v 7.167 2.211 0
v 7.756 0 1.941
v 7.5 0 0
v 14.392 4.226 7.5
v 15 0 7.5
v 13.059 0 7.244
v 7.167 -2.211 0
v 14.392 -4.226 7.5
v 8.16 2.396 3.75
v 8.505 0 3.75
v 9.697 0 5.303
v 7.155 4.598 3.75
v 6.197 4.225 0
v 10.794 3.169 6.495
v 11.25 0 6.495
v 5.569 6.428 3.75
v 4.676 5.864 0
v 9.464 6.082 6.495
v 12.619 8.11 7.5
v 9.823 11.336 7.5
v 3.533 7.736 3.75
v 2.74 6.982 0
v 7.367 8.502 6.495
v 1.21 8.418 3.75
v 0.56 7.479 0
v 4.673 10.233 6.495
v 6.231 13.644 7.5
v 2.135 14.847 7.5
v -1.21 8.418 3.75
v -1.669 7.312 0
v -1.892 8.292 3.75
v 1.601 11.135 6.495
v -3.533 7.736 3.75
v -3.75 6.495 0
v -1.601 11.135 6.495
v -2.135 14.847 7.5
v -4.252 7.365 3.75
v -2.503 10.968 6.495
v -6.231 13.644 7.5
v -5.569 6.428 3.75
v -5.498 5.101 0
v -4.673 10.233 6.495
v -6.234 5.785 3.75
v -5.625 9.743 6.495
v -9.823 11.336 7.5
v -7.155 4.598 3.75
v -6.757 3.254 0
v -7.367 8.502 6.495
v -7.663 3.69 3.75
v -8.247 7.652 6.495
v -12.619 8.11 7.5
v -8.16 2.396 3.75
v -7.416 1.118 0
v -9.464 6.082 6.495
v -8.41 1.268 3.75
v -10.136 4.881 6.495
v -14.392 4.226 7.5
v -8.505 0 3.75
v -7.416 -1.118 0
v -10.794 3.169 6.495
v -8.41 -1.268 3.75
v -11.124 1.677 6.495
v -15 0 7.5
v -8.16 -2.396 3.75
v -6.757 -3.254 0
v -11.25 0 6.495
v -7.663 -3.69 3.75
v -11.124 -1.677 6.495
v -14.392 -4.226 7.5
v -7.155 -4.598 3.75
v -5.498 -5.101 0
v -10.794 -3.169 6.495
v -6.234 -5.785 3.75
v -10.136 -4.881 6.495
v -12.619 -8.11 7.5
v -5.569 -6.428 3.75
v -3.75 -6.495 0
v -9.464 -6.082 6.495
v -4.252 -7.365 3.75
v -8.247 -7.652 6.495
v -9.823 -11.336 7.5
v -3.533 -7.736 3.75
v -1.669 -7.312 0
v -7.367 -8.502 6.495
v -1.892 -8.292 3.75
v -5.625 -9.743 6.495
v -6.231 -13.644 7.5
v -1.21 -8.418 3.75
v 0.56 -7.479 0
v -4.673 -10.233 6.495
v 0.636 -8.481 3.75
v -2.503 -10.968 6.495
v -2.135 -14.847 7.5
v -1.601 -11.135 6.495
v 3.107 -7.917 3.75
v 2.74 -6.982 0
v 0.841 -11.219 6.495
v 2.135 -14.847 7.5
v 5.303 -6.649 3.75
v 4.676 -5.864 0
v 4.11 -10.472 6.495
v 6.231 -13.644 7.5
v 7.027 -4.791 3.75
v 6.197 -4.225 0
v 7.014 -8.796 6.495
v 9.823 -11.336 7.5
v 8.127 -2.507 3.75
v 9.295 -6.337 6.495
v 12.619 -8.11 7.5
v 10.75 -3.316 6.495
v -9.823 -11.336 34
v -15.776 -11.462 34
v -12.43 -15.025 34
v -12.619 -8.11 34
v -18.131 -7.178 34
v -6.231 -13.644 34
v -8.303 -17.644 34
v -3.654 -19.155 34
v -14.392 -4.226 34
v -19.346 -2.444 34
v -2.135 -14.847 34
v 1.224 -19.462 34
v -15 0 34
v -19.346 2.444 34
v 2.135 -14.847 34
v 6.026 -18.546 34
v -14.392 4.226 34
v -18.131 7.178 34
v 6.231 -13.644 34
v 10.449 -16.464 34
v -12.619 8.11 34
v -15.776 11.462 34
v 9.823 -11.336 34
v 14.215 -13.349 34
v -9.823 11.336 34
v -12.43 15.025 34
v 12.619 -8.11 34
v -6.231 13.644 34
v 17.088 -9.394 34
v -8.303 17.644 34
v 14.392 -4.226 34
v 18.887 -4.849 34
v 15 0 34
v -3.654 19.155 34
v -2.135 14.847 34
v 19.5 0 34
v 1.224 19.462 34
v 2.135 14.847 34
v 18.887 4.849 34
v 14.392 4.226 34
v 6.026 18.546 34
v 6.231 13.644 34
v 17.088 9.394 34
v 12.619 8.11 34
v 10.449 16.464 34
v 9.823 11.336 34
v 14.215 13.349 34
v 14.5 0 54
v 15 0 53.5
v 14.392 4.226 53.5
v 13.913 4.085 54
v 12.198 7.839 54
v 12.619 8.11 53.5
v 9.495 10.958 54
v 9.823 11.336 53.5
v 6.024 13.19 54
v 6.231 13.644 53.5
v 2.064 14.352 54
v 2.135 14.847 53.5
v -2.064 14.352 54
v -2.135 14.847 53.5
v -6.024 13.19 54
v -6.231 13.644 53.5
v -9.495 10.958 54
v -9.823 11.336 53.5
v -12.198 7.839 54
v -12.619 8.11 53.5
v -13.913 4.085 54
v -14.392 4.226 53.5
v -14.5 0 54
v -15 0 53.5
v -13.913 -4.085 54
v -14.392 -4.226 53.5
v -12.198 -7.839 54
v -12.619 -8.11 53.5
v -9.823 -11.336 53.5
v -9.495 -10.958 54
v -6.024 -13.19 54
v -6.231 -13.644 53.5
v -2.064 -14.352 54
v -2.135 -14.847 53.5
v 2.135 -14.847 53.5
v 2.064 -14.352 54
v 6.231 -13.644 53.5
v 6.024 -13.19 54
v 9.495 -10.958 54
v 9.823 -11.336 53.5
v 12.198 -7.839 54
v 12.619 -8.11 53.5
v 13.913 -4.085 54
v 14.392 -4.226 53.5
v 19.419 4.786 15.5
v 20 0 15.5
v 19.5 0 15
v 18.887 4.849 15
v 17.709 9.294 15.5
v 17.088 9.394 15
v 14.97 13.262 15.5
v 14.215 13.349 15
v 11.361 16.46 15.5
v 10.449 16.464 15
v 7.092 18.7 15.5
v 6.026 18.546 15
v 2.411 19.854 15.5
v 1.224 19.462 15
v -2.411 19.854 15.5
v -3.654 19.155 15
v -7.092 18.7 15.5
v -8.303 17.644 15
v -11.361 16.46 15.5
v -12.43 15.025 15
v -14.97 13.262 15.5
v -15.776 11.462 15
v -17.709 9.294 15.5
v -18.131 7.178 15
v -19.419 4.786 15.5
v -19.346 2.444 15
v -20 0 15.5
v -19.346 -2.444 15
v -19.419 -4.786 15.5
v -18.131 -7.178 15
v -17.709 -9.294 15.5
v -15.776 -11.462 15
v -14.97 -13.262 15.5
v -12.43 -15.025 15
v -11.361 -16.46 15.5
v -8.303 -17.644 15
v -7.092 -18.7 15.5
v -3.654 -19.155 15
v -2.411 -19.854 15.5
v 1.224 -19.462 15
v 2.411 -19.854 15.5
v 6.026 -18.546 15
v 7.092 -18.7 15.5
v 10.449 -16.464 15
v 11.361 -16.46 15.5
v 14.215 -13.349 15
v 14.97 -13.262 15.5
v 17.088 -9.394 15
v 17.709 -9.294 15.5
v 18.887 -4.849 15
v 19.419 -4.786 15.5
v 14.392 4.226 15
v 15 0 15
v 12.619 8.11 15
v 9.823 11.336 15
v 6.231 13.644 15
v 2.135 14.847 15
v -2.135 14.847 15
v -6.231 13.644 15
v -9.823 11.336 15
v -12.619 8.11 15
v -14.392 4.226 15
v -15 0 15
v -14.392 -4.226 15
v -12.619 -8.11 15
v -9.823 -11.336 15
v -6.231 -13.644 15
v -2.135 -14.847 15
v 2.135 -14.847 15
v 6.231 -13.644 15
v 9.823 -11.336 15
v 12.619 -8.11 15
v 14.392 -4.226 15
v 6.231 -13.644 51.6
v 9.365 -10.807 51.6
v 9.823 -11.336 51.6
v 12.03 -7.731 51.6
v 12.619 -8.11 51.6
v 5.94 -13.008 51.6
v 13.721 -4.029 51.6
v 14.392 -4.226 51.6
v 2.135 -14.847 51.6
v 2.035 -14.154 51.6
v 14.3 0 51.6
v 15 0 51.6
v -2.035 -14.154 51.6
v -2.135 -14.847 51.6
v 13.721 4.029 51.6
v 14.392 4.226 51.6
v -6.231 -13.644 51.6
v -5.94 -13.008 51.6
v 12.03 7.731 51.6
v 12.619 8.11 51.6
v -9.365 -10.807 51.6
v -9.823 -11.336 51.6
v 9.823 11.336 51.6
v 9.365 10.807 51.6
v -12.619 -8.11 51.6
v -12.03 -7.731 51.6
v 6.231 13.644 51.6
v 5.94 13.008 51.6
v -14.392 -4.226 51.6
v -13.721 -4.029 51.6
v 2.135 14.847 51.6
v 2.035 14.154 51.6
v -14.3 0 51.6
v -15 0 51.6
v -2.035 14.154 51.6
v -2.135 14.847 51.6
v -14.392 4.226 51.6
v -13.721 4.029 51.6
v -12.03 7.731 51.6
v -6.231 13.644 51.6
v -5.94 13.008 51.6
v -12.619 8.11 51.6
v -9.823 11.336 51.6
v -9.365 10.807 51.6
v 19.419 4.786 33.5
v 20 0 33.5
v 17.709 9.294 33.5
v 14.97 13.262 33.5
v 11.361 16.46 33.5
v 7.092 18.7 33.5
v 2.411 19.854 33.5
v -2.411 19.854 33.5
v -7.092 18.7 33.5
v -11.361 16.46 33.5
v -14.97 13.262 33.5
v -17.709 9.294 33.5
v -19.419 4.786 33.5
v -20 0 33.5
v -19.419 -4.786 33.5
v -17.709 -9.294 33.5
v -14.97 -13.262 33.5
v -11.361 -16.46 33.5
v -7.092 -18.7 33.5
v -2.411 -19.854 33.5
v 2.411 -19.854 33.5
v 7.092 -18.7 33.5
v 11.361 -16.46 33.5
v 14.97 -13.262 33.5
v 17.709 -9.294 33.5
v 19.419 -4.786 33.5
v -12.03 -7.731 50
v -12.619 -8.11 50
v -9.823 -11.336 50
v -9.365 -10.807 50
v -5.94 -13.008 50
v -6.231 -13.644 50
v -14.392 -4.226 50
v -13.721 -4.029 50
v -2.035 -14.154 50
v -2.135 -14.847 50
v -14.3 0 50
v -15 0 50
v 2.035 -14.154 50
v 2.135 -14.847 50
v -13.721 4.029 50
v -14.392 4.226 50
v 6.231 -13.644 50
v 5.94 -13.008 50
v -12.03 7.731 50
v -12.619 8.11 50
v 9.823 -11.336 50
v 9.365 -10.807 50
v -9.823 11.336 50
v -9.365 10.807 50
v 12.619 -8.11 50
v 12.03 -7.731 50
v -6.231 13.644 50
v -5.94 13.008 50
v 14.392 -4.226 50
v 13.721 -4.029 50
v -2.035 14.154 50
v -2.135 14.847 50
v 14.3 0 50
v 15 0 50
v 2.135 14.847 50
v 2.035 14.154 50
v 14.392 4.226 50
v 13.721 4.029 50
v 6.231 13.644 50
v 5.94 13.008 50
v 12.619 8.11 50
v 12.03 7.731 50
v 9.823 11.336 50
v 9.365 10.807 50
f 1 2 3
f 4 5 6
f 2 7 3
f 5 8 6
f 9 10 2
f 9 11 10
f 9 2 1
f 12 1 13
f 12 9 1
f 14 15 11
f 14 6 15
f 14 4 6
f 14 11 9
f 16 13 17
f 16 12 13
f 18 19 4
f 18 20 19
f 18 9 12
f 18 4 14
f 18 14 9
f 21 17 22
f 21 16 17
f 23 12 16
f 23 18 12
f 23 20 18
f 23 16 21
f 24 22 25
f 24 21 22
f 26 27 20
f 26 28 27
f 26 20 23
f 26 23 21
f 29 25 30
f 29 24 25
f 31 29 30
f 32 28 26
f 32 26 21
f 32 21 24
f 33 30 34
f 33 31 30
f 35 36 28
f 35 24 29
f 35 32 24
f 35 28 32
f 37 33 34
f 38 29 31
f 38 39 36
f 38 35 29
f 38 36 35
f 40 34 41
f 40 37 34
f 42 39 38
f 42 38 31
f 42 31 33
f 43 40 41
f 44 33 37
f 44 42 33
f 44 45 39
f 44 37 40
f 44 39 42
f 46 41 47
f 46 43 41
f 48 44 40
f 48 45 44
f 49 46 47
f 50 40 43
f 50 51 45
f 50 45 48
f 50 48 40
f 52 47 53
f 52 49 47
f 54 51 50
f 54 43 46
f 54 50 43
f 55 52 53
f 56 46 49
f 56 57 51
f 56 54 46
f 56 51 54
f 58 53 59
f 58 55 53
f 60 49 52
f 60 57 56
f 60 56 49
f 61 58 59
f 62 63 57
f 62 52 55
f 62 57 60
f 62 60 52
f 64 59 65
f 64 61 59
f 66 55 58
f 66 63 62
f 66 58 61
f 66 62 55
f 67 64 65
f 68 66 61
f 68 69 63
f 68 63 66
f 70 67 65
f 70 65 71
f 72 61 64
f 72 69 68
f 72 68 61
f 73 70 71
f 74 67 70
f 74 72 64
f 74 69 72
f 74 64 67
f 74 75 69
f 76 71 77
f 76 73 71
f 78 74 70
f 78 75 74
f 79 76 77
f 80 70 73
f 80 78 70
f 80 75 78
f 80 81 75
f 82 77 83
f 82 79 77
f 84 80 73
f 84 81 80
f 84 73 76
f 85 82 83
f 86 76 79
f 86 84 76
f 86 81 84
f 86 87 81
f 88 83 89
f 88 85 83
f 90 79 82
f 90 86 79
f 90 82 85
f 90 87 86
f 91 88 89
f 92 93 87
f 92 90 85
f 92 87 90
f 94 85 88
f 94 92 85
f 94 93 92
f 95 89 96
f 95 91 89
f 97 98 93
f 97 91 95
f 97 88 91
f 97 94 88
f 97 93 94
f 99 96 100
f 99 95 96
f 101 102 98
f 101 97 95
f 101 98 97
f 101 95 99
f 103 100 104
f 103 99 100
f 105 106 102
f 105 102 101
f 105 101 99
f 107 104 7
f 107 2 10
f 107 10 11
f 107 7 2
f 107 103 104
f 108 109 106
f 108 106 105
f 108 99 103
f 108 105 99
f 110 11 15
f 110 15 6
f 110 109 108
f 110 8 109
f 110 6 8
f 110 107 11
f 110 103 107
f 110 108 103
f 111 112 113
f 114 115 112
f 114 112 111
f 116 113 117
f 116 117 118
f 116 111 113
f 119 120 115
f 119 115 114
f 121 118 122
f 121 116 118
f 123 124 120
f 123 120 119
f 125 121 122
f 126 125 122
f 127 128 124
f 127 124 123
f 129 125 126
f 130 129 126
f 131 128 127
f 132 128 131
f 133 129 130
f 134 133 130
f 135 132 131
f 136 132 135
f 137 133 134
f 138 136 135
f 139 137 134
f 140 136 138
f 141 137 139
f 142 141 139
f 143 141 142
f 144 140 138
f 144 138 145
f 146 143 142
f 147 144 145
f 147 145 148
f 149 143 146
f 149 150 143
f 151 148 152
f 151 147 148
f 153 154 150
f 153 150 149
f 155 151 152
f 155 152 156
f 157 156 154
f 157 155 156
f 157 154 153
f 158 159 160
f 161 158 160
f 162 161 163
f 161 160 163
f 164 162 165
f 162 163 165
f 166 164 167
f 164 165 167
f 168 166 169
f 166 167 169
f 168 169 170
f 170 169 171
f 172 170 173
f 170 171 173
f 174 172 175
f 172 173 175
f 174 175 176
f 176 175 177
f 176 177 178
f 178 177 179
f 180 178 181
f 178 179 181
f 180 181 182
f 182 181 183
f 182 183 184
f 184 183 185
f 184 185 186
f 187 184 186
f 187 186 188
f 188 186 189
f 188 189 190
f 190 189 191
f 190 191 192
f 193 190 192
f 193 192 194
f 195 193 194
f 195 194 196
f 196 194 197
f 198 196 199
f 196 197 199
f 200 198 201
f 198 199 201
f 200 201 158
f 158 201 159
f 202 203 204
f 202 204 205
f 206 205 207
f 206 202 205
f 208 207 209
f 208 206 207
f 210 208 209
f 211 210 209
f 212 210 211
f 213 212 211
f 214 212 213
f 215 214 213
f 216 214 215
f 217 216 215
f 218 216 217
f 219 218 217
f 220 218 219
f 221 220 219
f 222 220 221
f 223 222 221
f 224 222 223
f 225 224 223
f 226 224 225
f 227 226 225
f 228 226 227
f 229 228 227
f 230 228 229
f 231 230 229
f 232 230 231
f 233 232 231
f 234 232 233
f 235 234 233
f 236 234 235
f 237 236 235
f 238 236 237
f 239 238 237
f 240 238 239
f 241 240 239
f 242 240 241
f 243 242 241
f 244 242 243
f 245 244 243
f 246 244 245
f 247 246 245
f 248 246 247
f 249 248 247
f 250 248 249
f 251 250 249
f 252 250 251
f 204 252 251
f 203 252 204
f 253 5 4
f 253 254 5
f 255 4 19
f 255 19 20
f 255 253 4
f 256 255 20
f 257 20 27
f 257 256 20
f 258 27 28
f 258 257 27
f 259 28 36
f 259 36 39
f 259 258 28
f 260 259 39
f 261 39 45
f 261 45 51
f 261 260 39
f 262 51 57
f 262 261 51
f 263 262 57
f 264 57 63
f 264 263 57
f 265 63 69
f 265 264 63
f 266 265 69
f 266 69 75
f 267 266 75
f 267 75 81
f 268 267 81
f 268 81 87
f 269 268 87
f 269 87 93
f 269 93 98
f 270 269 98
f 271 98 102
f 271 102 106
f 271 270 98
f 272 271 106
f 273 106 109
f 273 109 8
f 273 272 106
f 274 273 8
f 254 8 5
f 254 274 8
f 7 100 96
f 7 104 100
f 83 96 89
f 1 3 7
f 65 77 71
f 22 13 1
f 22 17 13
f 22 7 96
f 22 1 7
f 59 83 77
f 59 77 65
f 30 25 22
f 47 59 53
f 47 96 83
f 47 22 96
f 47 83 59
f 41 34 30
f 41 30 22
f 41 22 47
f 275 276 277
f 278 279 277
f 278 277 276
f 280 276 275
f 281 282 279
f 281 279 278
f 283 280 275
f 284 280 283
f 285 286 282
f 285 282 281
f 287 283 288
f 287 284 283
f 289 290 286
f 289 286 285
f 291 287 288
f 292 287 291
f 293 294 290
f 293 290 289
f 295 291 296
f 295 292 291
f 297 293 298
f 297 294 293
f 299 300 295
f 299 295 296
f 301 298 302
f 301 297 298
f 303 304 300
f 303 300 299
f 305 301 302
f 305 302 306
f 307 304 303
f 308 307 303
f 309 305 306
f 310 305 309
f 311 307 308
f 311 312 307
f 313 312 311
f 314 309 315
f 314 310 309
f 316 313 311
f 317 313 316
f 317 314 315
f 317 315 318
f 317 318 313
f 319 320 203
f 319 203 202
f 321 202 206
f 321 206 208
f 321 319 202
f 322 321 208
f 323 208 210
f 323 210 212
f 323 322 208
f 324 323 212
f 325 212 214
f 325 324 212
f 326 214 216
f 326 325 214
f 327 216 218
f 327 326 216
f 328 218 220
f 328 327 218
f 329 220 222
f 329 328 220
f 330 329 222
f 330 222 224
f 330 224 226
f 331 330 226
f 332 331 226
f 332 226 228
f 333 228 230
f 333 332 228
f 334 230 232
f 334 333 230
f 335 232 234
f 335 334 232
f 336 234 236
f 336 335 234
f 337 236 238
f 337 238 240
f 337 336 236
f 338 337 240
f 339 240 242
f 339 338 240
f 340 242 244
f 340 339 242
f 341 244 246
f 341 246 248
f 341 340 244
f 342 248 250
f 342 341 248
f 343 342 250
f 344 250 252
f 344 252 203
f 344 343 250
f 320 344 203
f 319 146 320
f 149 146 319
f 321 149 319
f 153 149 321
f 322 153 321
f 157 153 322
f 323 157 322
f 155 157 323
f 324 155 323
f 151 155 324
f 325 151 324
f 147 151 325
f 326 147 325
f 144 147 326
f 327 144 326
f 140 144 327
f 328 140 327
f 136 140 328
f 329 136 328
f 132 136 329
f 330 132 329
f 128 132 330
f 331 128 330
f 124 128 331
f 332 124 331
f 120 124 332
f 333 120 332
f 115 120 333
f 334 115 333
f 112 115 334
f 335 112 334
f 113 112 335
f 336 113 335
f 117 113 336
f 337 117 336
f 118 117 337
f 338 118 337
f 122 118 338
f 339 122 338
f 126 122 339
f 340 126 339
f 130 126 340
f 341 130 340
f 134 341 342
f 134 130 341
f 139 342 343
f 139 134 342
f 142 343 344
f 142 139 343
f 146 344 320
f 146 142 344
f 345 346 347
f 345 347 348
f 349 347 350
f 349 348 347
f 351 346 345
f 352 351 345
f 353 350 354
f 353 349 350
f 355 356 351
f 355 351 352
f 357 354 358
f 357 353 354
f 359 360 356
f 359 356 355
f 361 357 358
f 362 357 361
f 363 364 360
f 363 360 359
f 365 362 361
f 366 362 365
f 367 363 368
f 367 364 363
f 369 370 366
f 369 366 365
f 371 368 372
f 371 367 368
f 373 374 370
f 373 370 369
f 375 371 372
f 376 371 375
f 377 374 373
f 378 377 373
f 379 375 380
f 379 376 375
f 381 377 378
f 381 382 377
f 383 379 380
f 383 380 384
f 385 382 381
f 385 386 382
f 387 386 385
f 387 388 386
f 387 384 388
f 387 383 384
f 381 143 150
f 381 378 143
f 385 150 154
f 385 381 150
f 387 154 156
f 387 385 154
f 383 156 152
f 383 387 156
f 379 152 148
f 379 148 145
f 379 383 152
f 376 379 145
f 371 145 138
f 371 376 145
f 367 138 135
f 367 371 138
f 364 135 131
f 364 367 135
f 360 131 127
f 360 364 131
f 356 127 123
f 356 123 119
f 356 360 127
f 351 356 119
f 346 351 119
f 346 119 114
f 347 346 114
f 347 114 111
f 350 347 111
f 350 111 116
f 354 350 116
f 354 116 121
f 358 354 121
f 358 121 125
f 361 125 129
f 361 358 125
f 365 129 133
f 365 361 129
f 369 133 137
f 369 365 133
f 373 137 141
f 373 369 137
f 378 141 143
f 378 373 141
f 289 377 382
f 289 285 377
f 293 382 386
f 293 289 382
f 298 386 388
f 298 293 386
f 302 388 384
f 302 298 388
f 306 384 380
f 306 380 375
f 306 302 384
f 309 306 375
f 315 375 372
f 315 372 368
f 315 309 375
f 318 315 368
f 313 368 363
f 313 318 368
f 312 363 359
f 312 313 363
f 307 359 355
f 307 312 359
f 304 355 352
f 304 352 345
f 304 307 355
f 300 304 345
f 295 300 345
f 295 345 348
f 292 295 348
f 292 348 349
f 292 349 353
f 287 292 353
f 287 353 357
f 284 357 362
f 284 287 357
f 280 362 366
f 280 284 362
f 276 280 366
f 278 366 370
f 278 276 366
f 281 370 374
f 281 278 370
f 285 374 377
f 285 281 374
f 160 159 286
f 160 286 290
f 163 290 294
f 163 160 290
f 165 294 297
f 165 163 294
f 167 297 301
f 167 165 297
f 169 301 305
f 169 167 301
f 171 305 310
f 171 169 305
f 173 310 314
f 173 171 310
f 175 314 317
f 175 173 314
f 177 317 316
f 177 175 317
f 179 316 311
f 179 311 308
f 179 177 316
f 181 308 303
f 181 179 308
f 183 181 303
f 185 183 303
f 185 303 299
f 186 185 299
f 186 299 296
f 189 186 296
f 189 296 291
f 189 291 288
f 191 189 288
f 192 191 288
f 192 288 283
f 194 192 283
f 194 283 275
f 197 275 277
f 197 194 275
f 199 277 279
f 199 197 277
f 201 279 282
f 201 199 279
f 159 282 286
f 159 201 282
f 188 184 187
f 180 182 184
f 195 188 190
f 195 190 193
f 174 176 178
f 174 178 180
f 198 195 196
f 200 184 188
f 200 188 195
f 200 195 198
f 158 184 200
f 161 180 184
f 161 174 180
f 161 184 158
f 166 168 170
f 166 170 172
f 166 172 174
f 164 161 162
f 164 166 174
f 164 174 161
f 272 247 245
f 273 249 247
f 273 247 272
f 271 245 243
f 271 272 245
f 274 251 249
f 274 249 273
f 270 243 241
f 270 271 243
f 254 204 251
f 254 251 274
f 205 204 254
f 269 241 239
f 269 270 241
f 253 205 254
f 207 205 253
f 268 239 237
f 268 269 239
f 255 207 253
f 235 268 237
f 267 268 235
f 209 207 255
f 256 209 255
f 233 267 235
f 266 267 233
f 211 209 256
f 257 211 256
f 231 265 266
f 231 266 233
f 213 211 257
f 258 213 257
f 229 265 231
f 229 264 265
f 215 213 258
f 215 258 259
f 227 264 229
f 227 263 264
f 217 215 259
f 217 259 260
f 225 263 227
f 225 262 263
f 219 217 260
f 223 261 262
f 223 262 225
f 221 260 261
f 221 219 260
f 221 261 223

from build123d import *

# Parameters (mm, degrees)
F2_SIZE = 0.5


with BuildPart() as f1:
    # F0 (on Front) → F1 (revolve)
    with BuildSketch(Plane.XZ):
        with BuildLine():
            Line((15, 54), (0, 54))
            Line((0, 54), (0, 0))
            Line((0, 0), (7.5, 0))
            ThreePointArc((7.5, 0), (9.696699, 5.303301), (15, 7.5))
            Line((15, 7.5), (15, 15))
            Line((15, 15), (20, 15))
            Line((20, 15), (20, 34))
            Line((20, 34), (15, 34))
            Line((15, 34), (15, 50))
            Line((15, 50), (14.3, 50))
            Line((14.3, 50), (14.3, 51.6))
            Line((14.3, 51.6), (15, 51.6))
            Line((15, 51.6), (15, 54))
        make_face()
    revolve(axis=Axis((0, 0, 27), (0, 0, 1)))

    # F2
    f2_edges = [f1.edges().sort_by_distance(p)[0] for p in [
        (-15, 0, 54),
        (-20, 0, 34),
        (-20, 0, 15),
    ]]
    chamfer(f2_edges, length=F2_SIZE)


solid = f1.part
